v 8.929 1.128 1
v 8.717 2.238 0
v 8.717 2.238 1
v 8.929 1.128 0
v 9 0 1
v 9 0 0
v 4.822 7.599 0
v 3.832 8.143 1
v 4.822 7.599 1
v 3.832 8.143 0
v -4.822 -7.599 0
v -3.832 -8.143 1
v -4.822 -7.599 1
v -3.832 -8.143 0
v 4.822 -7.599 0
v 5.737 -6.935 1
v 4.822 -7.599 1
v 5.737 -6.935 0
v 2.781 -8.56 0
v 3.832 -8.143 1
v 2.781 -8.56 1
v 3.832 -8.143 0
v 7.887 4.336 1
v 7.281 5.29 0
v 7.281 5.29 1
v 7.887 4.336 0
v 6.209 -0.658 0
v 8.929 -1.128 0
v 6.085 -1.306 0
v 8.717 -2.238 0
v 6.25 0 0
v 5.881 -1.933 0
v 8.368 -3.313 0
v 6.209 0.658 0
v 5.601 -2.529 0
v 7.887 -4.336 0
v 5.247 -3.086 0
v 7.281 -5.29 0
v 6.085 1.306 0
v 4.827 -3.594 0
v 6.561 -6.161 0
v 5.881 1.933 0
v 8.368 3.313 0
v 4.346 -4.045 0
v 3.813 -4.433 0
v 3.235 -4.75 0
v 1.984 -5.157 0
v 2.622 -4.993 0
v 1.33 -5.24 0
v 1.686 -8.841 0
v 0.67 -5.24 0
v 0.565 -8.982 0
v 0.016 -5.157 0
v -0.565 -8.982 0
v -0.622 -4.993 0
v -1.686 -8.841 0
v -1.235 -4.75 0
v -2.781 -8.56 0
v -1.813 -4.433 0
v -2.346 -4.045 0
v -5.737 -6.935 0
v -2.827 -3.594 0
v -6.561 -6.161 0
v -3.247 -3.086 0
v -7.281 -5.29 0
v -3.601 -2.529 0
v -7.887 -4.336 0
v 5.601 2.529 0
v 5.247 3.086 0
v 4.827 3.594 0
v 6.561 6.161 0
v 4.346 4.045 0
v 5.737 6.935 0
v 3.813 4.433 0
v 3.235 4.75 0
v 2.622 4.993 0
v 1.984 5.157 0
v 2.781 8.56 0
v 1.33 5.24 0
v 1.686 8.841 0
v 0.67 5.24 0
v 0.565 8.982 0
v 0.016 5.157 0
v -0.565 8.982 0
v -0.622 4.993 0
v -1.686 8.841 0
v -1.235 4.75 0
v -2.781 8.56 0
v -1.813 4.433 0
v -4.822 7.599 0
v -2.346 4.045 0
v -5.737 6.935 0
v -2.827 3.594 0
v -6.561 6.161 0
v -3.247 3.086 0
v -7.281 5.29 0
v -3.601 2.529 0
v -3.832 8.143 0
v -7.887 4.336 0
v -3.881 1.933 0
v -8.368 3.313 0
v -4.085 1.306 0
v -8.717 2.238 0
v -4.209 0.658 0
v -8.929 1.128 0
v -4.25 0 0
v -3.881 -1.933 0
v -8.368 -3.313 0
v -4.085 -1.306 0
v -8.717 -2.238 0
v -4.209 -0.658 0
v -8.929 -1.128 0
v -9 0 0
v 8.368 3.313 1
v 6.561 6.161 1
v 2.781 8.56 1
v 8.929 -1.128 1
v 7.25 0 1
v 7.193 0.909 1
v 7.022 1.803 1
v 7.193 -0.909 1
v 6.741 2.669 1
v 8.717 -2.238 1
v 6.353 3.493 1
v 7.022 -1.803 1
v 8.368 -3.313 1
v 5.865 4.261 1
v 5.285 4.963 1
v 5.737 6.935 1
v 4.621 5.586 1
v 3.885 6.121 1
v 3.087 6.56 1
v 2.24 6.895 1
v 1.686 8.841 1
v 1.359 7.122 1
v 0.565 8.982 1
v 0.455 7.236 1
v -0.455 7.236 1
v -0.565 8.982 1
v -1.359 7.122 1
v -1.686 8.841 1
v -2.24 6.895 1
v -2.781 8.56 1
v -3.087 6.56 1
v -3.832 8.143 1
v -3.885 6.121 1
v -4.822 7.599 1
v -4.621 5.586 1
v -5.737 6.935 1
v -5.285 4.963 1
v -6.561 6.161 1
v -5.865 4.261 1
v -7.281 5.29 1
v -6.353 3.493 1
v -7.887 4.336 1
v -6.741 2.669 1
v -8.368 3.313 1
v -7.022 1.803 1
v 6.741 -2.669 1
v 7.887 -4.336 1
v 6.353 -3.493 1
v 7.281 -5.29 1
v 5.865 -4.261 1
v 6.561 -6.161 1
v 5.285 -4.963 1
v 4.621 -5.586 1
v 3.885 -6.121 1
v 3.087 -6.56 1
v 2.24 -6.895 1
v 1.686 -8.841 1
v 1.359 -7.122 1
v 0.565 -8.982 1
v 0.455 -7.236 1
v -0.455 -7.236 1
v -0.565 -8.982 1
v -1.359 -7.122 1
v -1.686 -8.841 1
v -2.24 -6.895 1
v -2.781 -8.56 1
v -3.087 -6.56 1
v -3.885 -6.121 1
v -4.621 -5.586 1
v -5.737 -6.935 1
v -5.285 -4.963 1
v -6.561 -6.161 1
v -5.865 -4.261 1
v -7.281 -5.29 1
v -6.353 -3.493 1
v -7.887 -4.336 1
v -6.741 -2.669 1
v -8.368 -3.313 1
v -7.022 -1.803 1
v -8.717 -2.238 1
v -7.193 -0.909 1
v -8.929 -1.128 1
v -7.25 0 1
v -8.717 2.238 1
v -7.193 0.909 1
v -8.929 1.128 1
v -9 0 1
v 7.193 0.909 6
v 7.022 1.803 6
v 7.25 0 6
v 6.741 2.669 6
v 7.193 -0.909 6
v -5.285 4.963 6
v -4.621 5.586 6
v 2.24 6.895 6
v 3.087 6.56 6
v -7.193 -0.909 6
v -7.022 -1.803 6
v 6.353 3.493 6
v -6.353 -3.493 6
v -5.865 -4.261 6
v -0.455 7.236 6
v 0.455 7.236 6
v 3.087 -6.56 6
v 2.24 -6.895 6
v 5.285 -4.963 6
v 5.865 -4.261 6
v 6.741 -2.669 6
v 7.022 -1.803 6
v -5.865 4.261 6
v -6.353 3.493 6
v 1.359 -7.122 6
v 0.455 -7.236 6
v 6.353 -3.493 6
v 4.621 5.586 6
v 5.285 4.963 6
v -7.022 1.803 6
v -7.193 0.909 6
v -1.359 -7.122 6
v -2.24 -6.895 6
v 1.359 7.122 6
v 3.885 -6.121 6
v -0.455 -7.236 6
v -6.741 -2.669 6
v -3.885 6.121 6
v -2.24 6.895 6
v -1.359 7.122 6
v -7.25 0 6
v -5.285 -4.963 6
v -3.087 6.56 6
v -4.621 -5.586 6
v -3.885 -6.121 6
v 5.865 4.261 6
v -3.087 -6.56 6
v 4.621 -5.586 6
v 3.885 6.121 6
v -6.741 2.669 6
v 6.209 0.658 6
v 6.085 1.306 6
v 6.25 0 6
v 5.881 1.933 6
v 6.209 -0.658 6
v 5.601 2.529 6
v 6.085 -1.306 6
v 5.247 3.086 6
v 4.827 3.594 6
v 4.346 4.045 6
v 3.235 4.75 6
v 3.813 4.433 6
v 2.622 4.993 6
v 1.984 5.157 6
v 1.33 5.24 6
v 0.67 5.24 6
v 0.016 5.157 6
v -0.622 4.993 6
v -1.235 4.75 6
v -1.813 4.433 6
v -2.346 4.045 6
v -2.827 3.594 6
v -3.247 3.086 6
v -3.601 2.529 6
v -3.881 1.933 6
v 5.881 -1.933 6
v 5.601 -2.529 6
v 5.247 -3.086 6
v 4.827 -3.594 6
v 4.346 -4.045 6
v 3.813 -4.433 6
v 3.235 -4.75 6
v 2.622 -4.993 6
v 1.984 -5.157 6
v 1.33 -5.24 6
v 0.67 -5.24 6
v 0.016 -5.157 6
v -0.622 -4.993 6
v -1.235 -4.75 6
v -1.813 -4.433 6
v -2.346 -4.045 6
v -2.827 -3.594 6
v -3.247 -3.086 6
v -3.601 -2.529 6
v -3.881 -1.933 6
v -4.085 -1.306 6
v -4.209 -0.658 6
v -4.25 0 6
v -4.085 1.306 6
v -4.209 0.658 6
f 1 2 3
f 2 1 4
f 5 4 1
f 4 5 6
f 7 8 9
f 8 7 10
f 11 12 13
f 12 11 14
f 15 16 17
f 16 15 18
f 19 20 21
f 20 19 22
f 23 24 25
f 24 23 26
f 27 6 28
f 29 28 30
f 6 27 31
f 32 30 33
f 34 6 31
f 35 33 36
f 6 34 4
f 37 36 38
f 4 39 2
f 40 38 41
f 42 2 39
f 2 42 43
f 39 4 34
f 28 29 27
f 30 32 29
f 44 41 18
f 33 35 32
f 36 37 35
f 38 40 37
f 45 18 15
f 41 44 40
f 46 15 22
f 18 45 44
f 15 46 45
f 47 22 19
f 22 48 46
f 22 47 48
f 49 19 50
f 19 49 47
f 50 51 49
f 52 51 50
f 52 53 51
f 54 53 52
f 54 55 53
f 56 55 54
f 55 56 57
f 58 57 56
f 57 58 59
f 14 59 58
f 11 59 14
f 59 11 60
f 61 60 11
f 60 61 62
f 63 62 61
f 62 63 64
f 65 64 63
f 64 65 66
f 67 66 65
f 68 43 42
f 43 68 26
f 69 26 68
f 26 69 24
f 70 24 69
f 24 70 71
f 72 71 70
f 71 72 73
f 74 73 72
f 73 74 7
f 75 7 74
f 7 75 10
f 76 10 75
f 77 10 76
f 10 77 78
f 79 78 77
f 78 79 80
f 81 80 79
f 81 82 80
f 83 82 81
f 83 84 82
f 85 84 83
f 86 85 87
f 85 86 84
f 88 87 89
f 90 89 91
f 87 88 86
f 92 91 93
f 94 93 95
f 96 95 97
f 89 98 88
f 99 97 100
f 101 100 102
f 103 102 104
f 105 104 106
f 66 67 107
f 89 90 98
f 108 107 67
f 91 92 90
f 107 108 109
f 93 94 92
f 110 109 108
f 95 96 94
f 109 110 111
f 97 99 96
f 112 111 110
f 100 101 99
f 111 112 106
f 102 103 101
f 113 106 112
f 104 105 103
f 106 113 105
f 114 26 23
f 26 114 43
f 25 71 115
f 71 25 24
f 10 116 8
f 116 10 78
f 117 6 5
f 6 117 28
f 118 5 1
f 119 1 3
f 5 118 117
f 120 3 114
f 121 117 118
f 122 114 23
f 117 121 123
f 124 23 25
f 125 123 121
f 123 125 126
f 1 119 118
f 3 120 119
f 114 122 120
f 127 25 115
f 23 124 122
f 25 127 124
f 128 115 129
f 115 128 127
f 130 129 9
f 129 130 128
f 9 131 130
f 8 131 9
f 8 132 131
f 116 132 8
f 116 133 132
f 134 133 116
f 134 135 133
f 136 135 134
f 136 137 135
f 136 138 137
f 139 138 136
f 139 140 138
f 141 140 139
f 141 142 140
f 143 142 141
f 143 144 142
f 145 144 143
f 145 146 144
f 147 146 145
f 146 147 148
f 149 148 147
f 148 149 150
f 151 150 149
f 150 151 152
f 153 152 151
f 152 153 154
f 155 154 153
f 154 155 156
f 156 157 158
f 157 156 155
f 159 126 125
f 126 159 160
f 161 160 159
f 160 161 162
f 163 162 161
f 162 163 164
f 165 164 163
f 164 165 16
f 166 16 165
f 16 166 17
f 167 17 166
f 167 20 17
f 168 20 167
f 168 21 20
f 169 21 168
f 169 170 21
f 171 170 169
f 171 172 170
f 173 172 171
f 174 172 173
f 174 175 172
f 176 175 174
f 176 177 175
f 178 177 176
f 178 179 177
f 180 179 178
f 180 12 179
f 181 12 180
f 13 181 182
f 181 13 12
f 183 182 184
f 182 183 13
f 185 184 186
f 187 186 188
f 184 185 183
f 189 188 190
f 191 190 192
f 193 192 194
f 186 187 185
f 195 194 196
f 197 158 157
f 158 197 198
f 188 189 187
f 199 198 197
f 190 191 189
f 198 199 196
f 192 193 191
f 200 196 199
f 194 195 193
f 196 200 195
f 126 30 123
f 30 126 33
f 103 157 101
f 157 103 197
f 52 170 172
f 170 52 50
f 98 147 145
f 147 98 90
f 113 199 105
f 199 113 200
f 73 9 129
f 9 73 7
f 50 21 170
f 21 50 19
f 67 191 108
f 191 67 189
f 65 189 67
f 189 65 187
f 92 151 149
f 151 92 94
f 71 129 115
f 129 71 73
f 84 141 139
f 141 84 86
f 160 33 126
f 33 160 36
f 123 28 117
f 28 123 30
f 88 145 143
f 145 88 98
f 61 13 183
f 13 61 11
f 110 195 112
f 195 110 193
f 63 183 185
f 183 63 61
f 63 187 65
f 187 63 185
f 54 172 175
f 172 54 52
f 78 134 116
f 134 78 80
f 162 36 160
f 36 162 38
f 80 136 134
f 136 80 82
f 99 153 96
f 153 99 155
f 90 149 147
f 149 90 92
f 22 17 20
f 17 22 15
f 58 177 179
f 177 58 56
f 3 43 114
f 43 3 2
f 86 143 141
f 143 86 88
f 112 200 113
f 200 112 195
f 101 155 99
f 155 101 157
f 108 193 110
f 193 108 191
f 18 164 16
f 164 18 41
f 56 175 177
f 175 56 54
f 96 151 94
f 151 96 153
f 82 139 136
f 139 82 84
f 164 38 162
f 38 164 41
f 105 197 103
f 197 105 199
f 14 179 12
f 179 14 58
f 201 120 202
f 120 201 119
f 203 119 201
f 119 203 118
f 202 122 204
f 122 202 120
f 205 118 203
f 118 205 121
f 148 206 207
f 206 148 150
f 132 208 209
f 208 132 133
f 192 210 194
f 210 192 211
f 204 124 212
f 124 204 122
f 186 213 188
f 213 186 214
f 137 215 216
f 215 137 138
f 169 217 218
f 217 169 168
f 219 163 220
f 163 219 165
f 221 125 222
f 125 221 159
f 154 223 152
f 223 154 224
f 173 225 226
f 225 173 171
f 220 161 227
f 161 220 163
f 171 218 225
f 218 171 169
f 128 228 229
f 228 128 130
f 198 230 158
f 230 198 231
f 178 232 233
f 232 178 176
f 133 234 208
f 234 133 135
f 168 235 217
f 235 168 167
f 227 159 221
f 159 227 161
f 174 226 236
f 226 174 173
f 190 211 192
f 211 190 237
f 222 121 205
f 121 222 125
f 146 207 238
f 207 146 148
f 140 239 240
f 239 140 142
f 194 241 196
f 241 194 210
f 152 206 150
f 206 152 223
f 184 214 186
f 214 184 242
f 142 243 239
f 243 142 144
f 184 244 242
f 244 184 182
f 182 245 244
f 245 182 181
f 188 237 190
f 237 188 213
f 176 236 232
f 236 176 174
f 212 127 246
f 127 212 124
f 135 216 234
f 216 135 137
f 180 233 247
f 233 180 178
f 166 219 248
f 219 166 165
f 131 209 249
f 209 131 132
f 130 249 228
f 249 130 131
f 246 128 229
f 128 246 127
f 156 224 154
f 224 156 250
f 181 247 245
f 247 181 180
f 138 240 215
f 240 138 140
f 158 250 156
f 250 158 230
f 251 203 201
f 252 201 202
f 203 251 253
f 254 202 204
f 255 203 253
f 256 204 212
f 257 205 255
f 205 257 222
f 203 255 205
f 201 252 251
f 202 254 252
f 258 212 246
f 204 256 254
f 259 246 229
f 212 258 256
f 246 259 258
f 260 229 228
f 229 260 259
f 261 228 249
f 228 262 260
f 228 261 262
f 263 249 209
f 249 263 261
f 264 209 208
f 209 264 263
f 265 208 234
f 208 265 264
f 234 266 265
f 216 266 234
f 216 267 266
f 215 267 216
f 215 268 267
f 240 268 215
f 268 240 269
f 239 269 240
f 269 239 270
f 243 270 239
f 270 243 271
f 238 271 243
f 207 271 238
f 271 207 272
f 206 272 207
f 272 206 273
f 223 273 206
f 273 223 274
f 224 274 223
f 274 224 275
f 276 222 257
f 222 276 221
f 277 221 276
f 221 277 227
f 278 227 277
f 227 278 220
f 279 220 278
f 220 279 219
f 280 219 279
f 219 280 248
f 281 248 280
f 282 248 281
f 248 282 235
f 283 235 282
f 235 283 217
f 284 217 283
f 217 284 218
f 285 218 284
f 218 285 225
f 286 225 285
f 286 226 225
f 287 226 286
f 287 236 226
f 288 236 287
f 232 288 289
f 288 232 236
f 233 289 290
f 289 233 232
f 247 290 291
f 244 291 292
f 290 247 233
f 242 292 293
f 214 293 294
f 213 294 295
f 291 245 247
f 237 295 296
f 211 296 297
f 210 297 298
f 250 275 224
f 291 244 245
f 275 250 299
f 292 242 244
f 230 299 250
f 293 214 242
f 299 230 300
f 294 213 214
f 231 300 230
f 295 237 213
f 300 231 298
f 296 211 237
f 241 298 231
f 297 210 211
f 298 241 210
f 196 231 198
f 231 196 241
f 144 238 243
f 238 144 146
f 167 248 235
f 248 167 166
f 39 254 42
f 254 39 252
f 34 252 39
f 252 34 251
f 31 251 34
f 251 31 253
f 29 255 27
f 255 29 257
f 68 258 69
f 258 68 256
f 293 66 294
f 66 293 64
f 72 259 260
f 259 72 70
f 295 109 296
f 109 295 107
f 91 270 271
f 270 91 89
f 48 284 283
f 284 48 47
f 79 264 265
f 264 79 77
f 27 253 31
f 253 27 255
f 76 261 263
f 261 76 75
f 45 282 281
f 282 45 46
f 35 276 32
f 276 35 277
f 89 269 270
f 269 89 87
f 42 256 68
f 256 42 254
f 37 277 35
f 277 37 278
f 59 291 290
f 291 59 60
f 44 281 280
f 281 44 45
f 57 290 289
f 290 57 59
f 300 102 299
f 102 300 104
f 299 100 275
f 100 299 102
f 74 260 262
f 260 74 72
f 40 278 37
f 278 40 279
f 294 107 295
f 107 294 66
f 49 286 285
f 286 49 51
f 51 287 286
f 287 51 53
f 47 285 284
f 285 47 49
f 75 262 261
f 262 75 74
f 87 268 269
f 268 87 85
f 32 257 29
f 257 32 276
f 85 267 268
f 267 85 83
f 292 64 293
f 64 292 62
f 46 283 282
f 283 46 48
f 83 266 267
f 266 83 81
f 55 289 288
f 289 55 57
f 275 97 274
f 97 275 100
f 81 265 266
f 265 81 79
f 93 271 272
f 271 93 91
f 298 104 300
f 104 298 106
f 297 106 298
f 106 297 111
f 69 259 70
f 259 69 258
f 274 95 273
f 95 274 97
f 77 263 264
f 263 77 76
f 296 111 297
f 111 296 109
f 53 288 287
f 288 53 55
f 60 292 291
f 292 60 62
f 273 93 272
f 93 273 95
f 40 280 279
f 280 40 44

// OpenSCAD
$fn=50;

module spacer1() {
    difference() {
        cylinder(d=15,h=4.5);
        cylinder(d=10.5,h=7);
    }
}

module spacer2() {
    difference() {
        union() {
            cylinder(d=18,h=1);
            cylinder(d=14.5,h=6);
        }
        translate([1,0,0]) cylinder(d=10.5,h=7);
    }
}

spacer2();
